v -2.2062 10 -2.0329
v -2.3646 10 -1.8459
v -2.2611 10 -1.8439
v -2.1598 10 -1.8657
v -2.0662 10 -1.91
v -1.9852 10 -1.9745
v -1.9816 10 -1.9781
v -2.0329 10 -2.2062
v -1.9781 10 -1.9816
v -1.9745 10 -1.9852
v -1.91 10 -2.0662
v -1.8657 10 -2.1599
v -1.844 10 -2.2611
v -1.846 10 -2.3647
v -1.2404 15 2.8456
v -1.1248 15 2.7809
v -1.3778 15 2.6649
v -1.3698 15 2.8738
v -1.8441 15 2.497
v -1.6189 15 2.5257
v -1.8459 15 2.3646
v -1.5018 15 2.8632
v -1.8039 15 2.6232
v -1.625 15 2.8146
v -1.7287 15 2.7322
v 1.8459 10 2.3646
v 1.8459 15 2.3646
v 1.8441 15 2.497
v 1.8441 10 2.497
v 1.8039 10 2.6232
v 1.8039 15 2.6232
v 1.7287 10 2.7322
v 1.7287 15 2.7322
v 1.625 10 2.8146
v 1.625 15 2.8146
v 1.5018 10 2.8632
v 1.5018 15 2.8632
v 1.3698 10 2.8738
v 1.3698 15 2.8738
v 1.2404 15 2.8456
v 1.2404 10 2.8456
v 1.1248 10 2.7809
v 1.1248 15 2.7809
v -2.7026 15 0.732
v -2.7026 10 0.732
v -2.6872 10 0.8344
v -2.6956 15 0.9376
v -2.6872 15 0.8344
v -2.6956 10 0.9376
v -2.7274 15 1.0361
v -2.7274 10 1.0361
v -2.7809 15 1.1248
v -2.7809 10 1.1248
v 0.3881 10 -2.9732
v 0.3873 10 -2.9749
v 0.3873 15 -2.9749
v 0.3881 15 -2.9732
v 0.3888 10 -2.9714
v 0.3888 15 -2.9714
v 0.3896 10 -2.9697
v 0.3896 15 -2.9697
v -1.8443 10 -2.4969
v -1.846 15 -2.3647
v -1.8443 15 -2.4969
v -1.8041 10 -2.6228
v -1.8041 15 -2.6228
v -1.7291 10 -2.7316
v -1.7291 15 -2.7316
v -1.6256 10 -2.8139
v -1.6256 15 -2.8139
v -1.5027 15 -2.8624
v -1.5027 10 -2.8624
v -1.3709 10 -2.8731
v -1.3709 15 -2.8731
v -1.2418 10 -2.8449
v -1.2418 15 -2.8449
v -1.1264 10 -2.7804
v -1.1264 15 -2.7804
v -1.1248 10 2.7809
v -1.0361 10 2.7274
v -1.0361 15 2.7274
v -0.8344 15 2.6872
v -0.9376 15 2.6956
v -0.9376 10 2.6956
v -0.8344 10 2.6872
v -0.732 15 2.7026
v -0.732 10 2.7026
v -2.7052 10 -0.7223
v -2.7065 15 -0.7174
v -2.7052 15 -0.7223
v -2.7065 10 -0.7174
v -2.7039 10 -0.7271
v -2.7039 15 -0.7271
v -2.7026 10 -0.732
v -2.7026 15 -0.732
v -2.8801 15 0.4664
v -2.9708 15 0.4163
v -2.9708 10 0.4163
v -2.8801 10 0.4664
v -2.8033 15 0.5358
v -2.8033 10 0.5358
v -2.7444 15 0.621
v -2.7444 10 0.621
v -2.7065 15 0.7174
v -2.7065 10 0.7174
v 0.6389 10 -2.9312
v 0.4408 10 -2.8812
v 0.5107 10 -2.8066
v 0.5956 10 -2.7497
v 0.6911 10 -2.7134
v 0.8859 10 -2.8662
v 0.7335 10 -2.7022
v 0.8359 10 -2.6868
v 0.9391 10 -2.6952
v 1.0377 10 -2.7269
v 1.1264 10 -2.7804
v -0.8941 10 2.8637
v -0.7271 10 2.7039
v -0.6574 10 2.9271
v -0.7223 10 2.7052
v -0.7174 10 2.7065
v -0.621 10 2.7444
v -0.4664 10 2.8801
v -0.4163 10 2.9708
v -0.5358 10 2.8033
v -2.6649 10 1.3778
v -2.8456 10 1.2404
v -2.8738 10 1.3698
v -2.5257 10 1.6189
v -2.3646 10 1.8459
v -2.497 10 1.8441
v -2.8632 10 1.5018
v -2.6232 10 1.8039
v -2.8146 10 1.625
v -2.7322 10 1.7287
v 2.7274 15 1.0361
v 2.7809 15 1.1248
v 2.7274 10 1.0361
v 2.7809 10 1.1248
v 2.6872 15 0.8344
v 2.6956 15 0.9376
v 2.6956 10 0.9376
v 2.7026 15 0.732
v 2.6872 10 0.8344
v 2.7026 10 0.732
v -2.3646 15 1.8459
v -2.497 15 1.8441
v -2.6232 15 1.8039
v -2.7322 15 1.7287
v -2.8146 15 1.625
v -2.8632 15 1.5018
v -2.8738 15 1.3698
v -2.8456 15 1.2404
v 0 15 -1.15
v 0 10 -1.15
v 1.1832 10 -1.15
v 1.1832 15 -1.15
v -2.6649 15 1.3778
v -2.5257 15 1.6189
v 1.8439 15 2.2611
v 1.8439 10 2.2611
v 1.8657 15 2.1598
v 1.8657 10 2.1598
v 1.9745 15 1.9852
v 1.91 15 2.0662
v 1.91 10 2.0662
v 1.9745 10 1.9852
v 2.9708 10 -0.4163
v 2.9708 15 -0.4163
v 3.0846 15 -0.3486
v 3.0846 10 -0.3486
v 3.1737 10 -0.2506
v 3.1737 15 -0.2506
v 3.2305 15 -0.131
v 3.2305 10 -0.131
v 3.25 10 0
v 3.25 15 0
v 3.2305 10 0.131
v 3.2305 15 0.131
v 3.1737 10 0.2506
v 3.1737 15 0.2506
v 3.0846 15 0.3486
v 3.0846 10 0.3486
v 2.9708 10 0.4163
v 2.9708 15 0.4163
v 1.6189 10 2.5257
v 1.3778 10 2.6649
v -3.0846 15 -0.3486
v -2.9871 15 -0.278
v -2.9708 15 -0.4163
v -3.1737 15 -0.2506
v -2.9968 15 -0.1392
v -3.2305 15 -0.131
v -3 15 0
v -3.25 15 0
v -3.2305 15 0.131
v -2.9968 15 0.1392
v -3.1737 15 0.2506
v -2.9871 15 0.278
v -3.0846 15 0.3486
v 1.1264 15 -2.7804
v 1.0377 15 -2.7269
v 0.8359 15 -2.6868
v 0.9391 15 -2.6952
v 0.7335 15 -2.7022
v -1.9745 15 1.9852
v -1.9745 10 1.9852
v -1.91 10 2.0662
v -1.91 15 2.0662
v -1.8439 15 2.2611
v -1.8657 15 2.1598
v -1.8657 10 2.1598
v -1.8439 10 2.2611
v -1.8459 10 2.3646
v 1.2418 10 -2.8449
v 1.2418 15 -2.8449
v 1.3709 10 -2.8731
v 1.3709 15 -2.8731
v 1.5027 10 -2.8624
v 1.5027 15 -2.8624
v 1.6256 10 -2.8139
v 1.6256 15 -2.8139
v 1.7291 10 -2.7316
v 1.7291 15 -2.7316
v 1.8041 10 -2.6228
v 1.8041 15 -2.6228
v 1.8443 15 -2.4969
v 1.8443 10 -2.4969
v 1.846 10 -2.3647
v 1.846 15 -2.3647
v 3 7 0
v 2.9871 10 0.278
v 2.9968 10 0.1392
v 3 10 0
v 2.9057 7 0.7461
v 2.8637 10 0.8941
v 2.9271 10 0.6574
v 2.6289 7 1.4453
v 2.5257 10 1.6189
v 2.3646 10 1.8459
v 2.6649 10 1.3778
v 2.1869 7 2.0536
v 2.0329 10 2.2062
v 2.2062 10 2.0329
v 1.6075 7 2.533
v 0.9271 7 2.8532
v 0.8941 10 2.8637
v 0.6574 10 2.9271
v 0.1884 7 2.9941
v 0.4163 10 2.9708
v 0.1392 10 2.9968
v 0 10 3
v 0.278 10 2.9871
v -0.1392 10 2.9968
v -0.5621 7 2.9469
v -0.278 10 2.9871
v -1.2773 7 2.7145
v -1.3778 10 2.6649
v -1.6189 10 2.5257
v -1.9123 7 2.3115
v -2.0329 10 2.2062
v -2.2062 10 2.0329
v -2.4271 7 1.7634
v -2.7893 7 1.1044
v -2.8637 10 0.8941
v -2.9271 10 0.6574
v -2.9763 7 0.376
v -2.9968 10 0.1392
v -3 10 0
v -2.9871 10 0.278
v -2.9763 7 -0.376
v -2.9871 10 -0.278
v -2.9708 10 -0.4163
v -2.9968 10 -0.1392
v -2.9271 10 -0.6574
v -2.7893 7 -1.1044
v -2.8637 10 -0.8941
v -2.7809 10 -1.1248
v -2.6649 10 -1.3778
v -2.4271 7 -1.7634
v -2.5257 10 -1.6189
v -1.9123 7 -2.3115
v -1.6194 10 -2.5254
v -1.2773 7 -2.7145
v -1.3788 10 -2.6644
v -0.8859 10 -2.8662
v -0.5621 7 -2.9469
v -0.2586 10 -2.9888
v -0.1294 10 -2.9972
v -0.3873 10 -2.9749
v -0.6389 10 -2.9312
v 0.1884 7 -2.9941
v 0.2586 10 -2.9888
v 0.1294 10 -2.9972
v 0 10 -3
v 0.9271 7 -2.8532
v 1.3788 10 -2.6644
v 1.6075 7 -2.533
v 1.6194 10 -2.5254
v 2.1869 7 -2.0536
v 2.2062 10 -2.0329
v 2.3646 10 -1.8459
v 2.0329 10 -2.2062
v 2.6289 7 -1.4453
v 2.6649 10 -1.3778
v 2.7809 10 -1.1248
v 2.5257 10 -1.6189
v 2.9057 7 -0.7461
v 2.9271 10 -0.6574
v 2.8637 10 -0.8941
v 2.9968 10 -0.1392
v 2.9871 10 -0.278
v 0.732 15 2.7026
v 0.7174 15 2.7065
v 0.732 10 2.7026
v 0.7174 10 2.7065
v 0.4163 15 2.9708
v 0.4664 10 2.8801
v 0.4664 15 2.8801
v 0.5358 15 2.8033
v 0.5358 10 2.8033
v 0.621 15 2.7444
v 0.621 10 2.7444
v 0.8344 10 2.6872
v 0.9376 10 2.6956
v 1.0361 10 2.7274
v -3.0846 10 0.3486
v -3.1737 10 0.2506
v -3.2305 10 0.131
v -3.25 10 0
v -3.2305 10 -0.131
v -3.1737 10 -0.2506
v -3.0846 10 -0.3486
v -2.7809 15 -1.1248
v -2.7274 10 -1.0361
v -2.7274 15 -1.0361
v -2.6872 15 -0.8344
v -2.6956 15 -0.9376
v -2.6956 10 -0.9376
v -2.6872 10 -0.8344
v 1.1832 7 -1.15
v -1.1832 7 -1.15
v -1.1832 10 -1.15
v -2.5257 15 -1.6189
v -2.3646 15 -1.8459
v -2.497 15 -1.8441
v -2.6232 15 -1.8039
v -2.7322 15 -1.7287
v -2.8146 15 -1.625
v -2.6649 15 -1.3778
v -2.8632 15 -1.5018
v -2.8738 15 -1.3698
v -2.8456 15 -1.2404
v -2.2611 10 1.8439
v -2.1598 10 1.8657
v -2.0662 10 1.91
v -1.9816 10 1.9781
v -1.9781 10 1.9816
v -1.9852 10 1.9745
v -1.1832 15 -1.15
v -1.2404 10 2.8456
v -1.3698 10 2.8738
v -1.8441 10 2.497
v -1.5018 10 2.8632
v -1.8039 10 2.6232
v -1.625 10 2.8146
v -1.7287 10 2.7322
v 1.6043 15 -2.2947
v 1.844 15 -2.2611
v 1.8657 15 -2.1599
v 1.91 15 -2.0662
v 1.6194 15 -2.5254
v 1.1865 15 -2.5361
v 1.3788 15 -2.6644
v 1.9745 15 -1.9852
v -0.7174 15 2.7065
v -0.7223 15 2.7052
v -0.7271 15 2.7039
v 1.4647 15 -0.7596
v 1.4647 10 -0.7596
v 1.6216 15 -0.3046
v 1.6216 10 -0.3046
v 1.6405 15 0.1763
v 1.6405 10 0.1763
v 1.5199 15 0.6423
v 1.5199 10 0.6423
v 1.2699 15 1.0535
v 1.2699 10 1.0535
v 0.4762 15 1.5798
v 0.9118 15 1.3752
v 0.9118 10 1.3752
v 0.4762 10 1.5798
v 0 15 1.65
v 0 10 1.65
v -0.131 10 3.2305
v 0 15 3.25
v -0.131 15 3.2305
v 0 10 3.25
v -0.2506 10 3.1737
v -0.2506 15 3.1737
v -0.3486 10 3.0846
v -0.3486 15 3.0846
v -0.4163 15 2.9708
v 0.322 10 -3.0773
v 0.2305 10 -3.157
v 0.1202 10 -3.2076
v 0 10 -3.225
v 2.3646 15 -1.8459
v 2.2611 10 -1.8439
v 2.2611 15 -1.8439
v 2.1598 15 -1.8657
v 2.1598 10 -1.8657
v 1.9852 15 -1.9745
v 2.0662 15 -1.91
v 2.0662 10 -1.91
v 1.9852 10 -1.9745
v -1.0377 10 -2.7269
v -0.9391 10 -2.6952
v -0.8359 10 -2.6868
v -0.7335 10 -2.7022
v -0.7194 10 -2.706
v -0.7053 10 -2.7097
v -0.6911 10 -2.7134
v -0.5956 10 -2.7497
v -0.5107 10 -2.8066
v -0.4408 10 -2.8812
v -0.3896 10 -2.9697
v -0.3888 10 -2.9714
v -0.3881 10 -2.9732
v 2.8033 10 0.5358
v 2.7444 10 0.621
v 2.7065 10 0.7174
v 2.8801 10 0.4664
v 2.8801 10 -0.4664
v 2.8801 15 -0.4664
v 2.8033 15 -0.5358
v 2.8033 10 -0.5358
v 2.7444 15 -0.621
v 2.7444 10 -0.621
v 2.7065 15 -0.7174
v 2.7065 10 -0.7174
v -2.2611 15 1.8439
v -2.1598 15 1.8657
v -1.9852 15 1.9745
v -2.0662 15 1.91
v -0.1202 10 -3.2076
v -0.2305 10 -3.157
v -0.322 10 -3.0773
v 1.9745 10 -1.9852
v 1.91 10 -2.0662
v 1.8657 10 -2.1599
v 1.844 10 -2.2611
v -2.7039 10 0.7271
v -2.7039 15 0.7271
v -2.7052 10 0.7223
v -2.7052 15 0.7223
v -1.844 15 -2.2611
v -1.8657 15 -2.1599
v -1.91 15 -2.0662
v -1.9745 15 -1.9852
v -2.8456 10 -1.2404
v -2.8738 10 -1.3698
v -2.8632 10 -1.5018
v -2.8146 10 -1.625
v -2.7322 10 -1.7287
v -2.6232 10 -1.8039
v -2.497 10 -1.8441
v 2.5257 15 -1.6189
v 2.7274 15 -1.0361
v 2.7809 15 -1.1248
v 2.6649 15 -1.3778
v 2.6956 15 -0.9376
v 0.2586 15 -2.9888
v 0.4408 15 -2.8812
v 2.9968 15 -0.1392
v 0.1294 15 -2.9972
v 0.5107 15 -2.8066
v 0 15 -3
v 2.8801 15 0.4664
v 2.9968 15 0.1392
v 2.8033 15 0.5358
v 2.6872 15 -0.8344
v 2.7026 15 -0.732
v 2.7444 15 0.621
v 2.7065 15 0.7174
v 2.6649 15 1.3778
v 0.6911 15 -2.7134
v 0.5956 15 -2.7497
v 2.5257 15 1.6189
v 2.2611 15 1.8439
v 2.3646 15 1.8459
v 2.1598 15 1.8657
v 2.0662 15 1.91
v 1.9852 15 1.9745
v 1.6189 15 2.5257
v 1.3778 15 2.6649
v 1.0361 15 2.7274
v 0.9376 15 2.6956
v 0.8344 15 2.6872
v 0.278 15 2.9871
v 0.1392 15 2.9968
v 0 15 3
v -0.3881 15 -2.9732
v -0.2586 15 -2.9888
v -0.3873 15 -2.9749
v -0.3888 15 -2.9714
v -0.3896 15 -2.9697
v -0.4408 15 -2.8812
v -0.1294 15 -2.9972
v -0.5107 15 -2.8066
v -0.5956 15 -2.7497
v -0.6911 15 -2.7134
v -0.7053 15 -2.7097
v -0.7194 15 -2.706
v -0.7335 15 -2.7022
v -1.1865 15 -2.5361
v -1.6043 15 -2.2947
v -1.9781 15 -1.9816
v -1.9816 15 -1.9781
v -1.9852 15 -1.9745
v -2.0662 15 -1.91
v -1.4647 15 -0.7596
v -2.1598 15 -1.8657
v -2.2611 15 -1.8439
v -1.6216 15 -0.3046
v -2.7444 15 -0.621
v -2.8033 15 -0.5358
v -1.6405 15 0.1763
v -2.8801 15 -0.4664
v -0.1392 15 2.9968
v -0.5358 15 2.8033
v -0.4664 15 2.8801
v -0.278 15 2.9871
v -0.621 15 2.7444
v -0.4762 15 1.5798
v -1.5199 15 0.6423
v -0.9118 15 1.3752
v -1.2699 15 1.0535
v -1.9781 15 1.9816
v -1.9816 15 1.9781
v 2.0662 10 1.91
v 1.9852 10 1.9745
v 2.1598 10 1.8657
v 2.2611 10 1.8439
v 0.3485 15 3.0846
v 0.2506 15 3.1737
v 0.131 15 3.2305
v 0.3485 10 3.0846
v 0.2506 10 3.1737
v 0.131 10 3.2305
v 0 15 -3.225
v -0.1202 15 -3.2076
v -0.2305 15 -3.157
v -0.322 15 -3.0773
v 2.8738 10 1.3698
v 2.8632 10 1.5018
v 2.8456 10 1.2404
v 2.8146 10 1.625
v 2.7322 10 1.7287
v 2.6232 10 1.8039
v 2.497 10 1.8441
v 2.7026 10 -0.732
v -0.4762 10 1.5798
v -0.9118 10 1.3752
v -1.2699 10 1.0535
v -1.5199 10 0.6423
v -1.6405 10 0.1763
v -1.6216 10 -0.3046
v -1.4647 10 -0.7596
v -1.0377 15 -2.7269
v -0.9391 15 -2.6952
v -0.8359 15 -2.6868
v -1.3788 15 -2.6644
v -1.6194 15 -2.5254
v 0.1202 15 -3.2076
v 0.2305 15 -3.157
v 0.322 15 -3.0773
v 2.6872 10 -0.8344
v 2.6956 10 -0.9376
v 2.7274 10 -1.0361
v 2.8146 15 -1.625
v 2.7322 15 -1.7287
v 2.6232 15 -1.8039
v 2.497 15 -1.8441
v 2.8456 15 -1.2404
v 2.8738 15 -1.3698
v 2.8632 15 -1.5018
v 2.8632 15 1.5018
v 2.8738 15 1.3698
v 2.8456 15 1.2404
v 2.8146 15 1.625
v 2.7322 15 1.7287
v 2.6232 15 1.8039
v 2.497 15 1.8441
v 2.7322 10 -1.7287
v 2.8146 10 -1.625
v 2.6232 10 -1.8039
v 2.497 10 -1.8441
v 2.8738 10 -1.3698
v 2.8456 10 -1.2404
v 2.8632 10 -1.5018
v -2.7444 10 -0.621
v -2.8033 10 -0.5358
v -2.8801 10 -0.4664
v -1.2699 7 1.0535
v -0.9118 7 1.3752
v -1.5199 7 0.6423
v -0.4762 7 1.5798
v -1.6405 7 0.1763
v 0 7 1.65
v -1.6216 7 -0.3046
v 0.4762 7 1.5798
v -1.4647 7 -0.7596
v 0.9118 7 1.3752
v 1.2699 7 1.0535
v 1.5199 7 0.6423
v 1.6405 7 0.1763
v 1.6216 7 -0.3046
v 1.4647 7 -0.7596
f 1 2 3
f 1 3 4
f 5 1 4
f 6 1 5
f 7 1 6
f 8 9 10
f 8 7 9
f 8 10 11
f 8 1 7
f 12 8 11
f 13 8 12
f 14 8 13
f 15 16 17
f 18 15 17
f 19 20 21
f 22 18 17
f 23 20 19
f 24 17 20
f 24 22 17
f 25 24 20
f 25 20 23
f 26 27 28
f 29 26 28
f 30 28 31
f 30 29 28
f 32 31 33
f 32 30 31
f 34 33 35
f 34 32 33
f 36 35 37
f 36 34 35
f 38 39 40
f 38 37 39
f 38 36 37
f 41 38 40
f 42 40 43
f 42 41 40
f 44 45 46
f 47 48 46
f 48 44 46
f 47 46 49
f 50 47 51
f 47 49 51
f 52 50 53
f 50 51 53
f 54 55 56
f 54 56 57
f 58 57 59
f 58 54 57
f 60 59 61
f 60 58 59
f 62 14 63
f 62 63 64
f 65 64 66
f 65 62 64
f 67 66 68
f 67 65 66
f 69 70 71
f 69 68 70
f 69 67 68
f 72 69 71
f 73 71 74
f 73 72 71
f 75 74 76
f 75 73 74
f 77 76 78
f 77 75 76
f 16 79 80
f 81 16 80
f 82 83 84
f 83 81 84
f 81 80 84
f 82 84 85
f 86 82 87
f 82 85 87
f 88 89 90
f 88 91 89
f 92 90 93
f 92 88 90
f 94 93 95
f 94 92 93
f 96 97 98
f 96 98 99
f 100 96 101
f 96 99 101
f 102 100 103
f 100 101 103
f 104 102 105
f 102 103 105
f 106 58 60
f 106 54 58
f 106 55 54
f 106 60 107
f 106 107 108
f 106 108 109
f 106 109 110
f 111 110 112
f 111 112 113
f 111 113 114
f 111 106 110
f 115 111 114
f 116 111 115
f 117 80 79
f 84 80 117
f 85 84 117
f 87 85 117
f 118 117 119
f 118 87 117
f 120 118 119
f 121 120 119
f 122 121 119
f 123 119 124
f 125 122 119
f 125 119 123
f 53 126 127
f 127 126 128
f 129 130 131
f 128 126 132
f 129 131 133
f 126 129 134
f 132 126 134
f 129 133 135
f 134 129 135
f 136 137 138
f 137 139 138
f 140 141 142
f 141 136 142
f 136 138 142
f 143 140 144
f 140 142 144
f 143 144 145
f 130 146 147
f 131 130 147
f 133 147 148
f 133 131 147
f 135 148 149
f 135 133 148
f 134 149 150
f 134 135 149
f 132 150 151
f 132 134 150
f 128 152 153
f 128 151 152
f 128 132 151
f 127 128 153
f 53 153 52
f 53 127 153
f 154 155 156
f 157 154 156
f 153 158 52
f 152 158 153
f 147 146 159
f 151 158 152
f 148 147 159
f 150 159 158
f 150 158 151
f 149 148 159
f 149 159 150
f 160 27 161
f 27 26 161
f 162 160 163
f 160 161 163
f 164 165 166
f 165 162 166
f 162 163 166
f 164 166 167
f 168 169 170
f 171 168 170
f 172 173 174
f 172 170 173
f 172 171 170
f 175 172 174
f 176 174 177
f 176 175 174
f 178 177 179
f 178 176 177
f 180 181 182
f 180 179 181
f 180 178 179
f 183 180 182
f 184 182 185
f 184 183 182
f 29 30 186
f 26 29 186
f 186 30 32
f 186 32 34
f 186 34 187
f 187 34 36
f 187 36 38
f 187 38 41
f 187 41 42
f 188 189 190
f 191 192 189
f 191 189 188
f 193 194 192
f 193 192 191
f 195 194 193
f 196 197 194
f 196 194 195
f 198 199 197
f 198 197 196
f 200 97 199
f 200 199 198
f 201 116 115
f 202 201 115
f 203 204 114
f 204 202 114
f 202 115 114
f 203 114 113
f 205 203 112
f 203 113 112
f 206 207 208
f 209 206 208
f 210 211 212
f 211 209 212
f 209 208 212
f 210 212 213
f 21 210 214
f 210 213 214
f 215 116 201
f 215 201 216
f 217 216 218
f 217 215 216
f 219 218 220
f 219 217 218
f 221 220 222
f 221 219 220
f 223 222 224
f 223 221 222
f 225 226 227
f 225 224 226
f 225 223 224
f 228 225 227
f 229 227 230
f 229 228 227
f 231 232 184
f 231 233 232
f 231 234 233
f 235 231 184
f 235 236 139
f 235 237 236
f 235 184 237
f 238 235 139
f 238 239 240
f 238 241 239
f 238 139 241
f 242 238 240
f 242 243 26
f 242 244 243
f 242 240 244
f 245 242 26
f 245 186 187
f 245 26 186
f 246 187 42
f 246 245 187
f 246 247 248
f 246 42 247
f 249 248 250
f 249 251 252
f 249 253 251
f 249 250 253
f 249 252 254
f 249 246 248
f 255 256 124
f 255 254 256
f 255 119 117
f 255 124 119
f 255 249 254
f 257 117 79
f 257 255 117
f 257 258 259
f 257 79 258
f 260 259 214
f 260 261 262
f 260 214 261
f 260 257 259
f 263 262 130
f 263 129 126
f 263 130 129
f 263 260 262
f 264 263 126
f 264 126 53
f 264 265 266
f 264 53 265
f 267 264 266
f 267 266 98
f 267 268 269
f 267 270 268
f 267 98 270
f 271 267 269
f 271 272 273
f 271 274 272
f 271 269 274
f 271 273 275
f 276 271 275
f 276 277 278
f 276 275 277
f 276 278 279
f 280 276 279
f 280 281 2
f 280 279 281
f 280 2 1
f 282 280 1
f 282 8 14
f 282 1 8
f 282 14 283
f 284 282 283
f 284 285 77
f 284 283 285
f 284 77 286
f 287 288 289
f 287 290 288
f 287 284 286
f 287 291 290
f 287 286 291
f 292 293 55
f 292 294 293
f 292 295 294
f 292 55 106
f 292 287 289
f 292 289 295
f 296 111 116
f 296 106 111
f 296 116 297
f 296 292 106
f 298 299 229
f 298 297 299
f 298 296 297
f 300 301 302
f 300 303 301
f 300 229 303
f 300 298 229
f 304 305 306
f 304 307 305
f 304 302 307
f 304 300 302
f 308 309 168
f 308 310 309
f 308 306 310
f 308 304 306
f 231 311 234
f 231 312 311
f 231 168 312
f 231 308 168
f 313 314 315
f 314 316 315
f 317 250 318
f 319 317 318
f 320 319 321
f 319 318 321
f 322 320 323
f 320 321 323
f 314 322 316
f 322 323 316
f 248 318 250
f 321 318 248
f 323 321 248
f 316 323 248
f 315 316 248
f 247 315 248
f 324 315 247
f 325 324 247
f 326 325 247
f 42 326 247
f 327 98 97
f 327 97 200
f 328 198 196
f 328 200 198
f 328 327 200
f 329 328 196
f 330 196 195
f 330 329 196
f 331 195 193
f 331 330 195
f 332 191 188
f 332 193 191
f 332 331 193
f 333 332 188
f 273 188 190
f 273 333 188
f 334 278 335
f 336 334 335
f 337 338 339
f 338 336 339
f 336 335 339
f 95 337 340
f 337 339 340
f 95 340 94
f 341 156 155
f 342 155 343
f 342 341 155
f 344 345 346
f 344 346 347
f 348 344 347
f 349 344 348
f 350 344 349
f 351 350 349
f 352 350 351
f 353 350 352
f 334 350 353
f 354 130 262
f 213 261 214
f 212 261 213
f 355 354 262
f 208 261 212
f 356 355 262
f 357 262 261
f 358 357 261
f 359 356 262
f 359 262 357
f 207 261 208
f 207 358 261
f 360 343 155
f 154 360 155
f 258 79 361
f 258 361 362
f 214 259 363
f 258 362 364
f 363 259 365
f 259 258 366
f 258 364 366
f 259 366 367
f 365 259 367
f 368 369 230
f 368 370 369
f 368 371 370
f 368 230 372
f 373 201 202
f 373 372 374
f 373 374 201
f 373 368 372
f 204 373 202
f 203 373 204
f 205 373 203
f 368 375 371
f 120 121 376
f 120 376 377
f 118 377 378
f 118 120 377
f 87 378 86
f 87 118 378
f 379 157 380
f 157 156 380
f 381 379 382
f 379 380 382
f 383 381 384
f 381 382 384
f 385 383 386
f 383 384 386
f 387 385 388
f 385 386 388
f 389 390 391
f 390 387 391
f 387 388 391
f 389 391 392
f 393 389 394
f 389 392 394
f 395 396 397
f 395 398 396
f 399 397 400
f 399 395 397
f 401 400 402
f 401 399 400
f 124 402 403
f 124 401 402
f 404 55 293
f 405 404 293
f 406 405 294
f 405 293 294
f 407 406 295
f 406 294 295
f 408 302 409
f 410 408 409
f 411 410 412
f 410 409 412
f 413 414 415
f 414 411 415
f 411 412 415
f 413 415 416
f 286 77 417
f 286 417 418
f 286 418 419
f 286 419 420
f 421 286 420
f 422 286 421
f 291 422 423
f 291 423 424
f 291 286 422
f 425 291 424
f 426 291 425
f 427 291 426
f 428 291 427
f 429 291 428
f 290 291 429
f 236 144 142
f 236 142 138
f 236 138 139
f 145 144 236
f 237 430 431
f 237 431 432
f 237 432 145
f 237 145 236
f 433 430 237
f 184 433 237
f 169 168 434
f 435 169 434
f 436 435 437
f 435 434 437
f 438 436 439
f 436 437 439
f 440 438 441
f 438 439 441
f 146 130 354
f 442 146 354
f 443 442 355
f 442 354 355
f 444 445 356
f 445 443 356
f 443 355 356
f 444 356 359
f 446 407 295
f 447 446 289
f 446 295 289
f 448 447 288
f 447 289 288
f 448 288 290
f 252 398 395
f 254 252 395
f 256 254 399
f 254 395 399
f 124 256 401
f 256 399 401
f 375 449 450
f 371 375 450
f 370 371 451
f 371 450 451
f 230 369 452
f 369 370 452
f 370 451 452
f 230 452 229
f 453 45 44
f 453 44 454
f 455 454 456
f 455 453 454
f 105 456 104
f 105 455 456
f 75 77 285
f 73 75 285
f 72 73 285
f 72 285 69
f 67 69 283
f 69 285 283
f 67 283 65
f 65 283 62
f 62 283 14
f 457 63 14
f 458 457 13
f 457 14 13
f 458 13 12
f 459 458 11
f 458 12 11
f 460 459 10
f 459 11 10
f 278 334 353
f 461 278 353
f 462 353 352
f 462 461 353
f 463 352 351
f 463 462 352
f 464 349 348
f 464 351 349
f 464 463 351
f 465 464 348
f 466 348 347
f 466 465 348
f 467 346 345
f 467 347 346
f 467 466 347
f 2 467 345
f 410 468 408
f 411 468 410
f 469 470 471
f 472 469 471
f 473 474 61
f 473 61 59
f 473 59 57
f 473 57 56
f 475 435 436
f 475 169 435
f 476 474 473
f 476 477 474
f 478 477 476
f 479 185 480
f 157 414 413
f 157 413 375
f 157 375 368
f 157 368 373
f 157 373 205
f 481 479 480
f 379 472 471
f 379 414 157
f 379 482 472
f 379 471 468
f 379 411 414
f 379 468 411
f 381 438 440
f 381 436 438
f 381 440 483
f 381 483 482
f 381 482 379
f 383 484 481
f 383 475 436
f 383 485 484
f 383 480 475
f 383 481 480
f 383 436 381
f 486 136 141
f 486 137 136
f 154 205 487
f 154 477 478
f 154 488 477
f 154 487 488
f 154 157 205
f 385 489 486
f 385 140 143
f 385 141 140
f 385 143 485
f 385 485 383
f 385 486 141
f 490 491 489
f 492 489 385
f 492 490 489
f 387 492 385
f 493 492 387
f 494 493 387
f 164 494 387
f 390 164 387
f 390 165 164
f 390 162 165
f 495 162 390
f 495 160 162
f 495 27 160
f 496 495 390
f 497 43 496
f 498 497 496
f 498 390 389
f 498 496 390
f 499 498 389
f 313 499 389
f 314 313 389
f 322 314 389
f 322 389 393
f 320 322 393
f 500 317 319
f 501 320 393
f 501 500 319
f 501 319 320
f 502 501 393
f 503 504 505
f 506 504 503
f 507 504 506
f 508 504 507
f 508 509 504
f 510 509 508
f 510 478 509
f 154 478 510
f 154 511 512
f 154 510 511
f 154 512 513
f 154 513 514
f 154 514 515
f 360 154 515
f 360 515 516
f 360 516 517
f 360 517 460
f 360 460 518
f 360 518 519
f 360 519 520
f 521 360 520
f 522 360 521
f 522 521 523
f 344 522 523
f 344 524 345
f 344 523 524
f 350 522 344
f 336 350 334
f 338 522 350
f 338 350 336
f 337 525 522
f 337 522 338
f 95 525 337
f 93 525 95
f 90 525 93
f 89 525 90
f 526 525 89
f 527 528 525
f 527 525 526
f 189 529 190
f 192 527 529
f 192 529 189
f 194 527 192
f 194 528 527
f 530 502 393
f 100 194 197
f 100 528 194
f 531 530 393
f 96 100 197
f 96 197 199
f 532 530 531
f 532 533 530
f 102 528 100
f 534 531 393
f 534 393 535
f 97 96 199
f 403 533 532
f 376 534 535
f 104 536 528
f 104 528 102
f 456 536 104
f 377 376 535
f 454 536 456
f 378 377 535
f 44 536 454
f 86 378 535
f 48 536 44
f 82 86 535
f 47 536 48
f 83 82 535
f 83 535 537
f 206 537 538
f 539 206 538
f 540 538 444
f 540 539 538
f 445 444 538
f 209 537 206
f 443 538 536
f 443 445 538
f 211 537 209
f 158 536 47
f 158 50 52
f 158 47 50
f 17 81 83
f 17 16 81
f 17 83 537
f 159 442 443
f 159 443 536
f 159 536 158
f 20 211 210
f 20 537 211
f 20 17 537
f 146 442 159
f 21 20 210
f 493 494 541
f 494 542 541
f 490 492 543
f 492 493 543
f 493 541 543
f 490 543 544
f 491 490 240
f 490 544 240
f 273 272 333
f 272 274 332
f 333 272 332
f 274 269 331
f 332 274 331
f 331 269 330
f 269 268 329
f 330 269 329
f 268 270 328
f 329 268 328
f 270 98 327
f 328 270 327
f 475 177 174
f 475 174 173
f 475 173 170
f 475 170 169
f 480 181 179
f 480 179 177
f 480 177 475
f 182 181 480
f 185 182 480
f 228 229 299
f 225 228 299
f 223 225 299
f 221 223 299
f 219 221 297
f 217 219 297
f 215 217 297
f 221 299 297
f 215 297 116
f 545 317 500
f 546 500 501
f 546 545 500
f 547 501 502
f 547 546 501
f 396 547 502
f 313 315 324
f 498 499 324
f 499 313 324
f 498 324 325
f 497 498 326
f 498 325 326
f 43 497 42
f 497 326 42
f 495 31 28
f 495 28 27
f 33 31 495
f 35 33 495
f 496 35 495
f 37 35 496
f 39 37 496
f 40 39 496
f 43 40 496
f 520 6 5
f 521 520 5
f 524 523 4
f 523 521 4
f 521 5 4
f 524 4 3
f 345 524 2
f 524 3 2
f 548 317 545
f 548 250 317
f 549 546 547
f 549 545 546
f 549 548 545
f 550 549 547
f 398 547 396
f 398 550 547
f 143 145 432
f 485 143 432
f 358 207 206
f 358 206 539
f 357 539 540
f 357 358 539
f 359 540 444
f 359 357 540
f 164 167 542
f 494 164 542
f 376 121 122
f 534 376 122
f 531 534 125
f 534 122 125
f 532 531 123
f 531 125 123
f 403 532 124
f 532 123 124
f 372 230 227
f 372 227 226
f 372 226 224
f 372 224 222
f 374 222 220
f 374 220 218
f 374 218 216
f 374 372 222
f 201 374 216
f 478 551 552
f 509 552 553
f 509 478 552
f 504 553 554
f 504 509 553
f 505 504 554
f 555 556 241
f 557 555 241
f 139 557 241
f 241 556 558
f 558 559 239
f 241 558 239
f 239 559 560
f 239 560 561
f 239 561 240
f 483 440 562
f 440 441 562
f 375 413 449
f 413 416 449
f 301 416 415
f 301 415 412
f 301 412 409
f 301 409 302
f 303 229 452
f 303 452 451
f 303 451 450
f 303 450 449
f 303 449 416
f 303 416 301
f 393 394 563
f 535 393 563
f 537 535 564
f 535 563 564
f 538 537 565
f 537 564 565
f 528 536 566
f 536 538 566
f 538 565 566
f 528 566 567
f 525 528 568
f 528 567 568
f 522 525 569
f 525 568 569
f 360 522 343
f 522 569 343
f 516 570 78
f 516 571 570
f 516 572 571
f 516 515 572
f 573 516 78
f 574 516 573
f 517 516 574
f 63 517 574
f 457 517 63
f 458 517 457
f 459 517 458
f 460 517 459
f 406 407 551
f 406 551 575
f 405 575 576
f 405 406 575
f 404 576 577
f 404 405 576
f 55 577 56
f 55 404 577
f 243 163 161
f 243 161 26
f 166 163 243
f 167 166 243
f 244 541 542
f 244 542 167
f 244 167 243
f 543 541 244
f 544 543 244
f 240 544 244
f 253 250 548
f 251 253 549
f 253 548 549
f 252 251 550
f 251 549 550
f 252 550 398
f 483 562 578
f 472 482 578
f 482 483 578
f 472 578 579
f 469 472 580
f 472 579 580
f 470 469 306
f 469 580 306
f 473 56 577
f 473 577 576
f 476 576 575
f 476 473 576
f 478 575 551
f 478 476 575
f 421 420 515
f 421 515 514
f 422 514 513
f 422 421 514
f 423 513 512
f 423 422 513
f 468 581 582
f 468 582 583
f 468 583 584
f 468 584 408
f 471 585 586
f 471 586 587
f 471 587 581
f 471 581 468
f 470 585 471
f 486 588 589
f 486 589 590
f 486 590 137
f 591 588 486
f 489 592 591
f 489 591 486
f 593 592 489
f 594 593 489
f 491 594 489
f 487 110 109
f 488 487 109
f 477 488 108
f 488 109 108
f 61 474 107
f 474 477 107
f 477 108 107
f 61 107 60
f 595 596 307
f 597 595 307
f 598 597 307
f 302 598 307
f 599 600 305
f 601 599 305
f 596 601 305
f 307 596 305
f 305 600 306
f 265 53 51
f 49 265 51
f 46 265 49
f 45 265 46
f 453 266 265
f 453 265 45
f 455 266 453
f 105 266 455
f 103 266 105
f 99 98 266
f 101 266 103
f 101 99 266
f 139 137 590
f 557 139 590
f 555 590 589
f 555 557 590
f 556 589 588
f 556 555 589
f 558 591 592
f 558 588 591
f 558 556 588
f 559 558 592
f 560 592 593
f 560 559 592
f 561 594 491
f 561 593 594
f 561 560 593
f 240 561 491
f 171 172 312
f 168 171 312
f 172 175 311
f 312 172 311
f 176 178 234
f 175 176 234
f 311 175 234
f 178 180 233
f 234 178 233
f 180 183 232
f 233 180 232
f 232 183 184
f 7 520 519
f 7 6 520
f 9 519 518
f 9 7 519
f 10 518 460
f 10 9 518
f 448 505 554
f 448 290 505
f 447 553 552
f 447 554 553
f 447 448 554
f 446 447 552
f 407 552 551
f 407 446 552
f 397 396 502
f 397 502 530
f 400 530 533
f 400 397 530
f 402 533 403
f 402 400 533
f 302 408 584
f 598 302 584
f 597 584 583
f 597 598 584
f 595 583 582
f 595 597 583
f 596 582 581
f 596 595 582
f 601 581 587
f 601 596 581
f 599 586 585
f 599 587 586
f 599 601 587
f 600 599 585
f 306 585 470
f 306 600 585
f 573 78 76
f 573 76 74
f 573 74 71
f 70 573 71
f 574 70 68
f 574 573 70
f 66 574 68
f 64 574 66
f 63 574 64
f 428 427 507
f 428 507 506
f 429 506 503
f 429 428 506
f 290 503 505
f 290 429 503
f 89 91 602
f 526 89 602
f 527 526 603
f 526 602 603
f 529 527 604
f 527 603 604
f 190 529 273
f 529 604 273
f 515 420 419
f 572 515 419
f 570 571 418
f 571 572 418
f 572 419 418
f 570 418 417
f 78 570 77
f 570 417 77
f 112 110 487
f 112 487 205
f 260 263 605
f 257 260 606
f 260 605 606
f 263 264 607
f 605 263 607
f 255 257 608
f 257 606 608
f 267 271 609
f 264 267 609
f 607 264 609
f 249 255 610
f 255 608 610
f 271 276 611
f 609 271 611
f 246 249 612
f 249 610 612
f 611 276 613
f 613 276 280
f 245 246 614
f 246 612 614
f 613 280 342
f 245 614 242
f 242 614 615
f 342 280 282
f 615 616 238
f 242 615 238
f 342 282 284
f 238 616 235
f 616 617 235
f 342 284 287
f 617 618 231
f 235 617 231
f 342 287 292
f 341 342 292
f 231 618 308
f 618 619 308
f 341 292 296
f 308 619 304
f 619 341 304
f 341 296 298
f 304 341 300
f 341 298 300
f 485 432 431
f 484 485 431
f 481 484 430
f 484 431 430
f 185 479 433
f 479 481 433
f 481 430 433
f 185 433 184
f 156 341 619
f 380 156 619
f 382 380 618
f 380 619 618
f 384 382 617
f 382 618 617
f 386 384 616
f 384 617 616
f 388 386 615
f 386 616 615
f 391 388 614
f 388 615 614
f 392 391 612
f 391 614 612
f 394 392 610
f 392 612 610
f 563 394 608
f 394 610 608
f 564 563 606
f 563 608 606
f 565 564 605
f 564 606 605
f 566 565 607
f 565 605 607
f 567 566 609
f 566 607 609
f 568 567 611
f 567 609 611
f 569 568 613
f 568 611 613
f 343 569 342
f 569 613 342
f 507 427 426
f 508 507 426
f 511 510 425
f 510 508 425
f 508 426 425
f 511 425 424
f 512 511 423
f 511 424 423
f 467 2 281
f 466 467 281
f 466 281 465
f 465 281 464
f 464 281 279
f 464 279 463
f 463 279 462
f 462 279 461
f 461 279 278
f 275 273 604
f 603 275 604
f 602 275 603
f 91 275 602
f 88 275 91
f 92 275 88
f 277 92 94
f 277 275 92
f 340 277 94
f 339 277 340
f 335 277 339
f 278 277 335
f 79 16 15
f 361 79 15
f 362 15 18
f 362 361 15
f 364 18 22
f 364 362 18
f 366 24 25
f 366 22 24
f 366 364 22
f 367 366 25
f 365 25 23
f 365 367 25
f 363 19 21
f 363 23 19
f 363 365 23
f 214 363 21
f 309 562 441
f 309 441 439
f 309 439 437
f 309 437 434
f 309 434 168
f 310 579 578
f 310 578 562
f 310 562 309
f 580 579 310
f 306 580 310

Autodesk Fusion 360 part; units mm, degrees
sketch "Sketch1" plane through (0, 0, 0) normal (0, 1, 0) x (1, 0, 0)
  circle A0 centre (0, 0) radius 3
  line L0 (0, -1.5) -> (0, 1)
  line L1 (0, 1) -> (1.118, 1)
  line L2 (1.118, 1) -> (-1.118, 1)
  arc A1 (-1.118, 1) -> (1.118, 1) centre (0, 0) ccw
  line L3 (1.1832, 1.15) -> (-1.1832, 1.15)
  arc A2 (-1.1832, 1.15) -> (1.1832, 1.15) centre (0, 0) ccw
  dimension "d1" = 3
  dimension "d2" = 6
  dimension "d3" = 2.5
  dimension "d4" = 1
  dimension "d5" = 0.15
extrude "Extrude1" add sketch "Sketch1" along normal blind 10 contours A0
sketch "Sketch2" plane through (0, 10, 0) normal (0, 1, 0) x (-1, 0, 0)
  arc A0 (1.1832, -1.15) -> (-1.1832, -1.15) centre (0, 0) ccw
  line L0 (1.1832, -1.15) -> (-1.1832, -1.15)
  circle A1 centre (0, 0) radius 3
  circle A2 centre (0, 0) radius 3.4
  arc A3 (1.1264, -2.7804) -> (1.846, -2.3647) centre (1.4009, -2.425) ccw
  arc A4 (-0.3896, -2.9697) -> (0.3896, -2.9697) centre (0, -2.8) ccw
  arc A5 (1.9745, -1.9852) -> (1.9852, -1.9745) centre (0, 0) ccw
  arc A6 (0.6911, -2.7134) -> (0.7335, -2.7022) centre (0, 0) ccw
  arc A7 (1.1264, -2.7804) -> (0.7335, -2.7022) centre (0.8514, -3.1365) ccw
  arc A8 (0.6911, -2.7134) -> (0.3896, -2.9697) centre (0.8022, -3.1494) ccw
  arc A9 (-0.3896, -2.9697) -> (-0.6911, -2.7134) centre (-0.8022, -3.1494) ccw
  arc A10 (1.9745, -1.9852) -> (1.846, -2.3647) centre (2.2919, -2.3043) ccw
  arc A11 (2.3646, -1.8459) -> (2.7809, -1.1248) centre (2.4249, -1.4) ccw
  arc A12 (2.9708, -0.4163) -> (2.9708, 0.4163) centre (2.8, 0) ccw
  arc A13 (2.7809, 1.1248) -> (2.3646, 1.8459) centre (2.4249, 1.4) ccw
  arc A14 (1.8459, 2.3646) -> (1.1248, 2.7809) centre (1.4, 2.4249) ccw
  arc A15 (0.4163, 2.9708) -> (-0.4485, 2.7638) centre (0, 2.8) ccw
  arc A16 (2.3646, -1.8459) -> (1.9852, -1.9745) centre (2.3043, -2.2919) ccw
  arc A17 (2.7065, 0.7174) -> (2.7026, 0.732) centre (0, 0) ccw
  arc A18 (2.7026, -0.732) -> (2.7065, -0.7174) centre (0, 0) ccw
  arc A19 (2.9708, -0.4163) -> (2.7065, -0.7174) centre (3.1415, -0.8327) ccw
  arc A20 (2.7026, -0.732) -> (2.7809, -1.1248) centre (3.137, -0.8496) ccw
  arc A21 (2.7065, 0.7174) -> (2.9708, 0.4163) centre (3.1415, 0.8327) ccw
  arc A22 (2.7809, 1.1248) -> (2.7026, 0.732) centre (3.137, 0.8496) ccw
  arc A23 (1.9852, 1.9745) -> (1.9745, 1.9852) centre (0, 0) ccw
  arc A24 (0.7335, -2.7022) -> (1.9745, -1.9852) centre (0, 0) ccw
  arc A25 (1.9852, 1.9745) -> (2.3646, 1.8459) centre (2.3043, 2.2919) ccw
  arc A26 (1.8459, 2.3646) -> (1.9745, 1.9852) centre (2.2919, 2.3043) ccw
  arc A27 (0.732, 2.7026) -> (0.7174, 2.7065) centre (0, 0) ccw
  arc A28 (0.732, 2.7026) -> (1.1248, 2.7809) centre (0.8496, 3.137) ccw
  arc A29 (0.4163, 2.9708) -> (0.7174, 2.7065) centre (0.8327, 3.1415) ccw
  line L1 (0, -4) -> (0, 4.5)
  arc A30 (-0.3896, -2.9697) -> (0.3896, -2.9697) centre (0, -2.8) ccw
  arc A31 (-0.3896, -2.9697) -> (-0.6911, -2.7134) centre (-0.8022, -3.1494) ccw
  arc A32 (-1.9745, -1.9852) -> (-0.7335, -2.7022) centre (0, 0) ccw
  arc A33 (-0.7335, -2.7022) -> (-1.1264, -2.7804) centre (-0.8514, -3.1365) ccw
  arc A34 (-1.846, -2.3647) -> (-1.1264, -2.7804) centre (-1.4009, -2.425) ccw
  arc A35 (-1.846, -2.3647) -> (-1.9745, -1.9852) centre (-2.2919, -2.3043) ccw
  arc A36 (-1.9852, -1.9745) -> (-2.3646, -1.8459) centre (-2.3043, -2.2919) ccw
  arc A37 (-2.7809, -1.1248) -> (-2.3646, -1.8459) centre (-2.4249, -1.4) ccw
  arc A38 (-2.7809, -1.1248) -> (-2.7026, -0.732) centre (-3.137, -0.8496) ccw
  arc A39 (-2.7065, -0.7174) -> (-2.9708, -0.4163) centre (-3.1415, -0.8327) ccw
  arc A40 (-2.9708, 0.4163) -> (-2.9708, -0.4163) centre (-2.8, 0) ccw
  arc A41 (-2.9708, 0.4163) -> (-2.7065, 0.7174) centre (-3.1415, 0.8327) ccw
  arc A42 (-2.7026, 0.732) -> (-2.7809, 1.1248) centre (-3.137, 0.8496) ccw
  arc A43 (-2.3646, 1.8459) -> (-2.7809, 1.1248) centre (-2.4249, 1.4) ccw
  arc A44 (-1.1248, 2.7809) -> (-1.8459, 2.3646) centre (-1.4, 2.4249) ccw
  arc A45 (0.4485, 2.7638) -> (-0.4163, 2.9708) centre (0, 2.8) ccw
  circle A46 centre (0, 0) radius 3
  arc A47 (-2.3646, 1.8459) -> (-1.9852, 1.9745) centre (-2.3043, 2.2919) ccw
  arc A48 (-1.9745, 1.9852) -> (-1.8459, 2.3646) centre (-2.2919, 2.3043) ccw
  arc A49 (-1.1248, 2.7809) -> (-0.732, 2.7026) centre (-0.8496, 3.137) ccw
  arc A50 (-0.7174, 2.7065) -> (-0.4163, 2.9708) centre (-0.8327, 3.1415) ccw
  line L2 (-1.9745, 1.9852) -> (-1.9852, 1.9745)
  line L3 (-0.7174, 2.7065) -> (-0.732, 2.7026)
  line L4 (-2.7026, 0.732) -> (-2.7065, 0.7174)
  line L5 (-2.7065, -0.7174) -> (-2.7026, -0.732)
  line L6 (-1.9852, -1.9745) -> (-1.9745, -1.9852)
  line L7 (-0.6911, -2.7134) -> (-0.7335, -2.7022)
  dimension "d8" = 6.8
  dimension "d9" = 5.6
  dimension "d10" = 0.85
  dimension "d13" = 0.45
  dimension "d14" = 0.45
  dimension "d15" = 0.45
  dimension "d16" = 0.45
  dimension "d17" = 0.45
  dimension "d18" = 0.45
  dimension "d19" = 0.45
  dimension "d20" = 0.45
  dimension "d21" = 0.45
  dimension "d22" = 0.45
  dimension "d23" = 0.45
  dimension "d24" = 0.45
  dimension "d25" = 0.45
extrude "Extrude2" add sketch "Sketch2" along normal blind 5 contours A0 L0 A1 A4 A5 A6 A8 A16 A17 A18 A19 A20 A21 A22 A23 A24 A25 A26 A27 A28 A29 L1 A30 A46 | A0 L0 A1 A4 A9 L1 A30 A31 A32 A36 A38 A39 A41 A42 A46 A47 A48 A49 A50 L2 L3 L4 L5 L6 L7 | A1 A15 L1 A45 A46 | A1 A15 L1 A45 A46 | A1 A4 L1 A30 A46 | A1 A4 L1 A30 A46 | A1 A14 A46 | A1 A44 A46 | A1 A34 A46 | A1 A32 A33 A35 A46 | A1 A7 A10 A24 A46 | A1 A3 A46 | A1 A13 A46 | A1 A43 A46 | A1 A37 A46 | A1 A11 A46 | A1 A12 A46 | A1 A40 A46
extrude "Extrude3" cut 1 faces at (0.0747, 0, -1.7639) along direction (0, 1, 0) blind 7
